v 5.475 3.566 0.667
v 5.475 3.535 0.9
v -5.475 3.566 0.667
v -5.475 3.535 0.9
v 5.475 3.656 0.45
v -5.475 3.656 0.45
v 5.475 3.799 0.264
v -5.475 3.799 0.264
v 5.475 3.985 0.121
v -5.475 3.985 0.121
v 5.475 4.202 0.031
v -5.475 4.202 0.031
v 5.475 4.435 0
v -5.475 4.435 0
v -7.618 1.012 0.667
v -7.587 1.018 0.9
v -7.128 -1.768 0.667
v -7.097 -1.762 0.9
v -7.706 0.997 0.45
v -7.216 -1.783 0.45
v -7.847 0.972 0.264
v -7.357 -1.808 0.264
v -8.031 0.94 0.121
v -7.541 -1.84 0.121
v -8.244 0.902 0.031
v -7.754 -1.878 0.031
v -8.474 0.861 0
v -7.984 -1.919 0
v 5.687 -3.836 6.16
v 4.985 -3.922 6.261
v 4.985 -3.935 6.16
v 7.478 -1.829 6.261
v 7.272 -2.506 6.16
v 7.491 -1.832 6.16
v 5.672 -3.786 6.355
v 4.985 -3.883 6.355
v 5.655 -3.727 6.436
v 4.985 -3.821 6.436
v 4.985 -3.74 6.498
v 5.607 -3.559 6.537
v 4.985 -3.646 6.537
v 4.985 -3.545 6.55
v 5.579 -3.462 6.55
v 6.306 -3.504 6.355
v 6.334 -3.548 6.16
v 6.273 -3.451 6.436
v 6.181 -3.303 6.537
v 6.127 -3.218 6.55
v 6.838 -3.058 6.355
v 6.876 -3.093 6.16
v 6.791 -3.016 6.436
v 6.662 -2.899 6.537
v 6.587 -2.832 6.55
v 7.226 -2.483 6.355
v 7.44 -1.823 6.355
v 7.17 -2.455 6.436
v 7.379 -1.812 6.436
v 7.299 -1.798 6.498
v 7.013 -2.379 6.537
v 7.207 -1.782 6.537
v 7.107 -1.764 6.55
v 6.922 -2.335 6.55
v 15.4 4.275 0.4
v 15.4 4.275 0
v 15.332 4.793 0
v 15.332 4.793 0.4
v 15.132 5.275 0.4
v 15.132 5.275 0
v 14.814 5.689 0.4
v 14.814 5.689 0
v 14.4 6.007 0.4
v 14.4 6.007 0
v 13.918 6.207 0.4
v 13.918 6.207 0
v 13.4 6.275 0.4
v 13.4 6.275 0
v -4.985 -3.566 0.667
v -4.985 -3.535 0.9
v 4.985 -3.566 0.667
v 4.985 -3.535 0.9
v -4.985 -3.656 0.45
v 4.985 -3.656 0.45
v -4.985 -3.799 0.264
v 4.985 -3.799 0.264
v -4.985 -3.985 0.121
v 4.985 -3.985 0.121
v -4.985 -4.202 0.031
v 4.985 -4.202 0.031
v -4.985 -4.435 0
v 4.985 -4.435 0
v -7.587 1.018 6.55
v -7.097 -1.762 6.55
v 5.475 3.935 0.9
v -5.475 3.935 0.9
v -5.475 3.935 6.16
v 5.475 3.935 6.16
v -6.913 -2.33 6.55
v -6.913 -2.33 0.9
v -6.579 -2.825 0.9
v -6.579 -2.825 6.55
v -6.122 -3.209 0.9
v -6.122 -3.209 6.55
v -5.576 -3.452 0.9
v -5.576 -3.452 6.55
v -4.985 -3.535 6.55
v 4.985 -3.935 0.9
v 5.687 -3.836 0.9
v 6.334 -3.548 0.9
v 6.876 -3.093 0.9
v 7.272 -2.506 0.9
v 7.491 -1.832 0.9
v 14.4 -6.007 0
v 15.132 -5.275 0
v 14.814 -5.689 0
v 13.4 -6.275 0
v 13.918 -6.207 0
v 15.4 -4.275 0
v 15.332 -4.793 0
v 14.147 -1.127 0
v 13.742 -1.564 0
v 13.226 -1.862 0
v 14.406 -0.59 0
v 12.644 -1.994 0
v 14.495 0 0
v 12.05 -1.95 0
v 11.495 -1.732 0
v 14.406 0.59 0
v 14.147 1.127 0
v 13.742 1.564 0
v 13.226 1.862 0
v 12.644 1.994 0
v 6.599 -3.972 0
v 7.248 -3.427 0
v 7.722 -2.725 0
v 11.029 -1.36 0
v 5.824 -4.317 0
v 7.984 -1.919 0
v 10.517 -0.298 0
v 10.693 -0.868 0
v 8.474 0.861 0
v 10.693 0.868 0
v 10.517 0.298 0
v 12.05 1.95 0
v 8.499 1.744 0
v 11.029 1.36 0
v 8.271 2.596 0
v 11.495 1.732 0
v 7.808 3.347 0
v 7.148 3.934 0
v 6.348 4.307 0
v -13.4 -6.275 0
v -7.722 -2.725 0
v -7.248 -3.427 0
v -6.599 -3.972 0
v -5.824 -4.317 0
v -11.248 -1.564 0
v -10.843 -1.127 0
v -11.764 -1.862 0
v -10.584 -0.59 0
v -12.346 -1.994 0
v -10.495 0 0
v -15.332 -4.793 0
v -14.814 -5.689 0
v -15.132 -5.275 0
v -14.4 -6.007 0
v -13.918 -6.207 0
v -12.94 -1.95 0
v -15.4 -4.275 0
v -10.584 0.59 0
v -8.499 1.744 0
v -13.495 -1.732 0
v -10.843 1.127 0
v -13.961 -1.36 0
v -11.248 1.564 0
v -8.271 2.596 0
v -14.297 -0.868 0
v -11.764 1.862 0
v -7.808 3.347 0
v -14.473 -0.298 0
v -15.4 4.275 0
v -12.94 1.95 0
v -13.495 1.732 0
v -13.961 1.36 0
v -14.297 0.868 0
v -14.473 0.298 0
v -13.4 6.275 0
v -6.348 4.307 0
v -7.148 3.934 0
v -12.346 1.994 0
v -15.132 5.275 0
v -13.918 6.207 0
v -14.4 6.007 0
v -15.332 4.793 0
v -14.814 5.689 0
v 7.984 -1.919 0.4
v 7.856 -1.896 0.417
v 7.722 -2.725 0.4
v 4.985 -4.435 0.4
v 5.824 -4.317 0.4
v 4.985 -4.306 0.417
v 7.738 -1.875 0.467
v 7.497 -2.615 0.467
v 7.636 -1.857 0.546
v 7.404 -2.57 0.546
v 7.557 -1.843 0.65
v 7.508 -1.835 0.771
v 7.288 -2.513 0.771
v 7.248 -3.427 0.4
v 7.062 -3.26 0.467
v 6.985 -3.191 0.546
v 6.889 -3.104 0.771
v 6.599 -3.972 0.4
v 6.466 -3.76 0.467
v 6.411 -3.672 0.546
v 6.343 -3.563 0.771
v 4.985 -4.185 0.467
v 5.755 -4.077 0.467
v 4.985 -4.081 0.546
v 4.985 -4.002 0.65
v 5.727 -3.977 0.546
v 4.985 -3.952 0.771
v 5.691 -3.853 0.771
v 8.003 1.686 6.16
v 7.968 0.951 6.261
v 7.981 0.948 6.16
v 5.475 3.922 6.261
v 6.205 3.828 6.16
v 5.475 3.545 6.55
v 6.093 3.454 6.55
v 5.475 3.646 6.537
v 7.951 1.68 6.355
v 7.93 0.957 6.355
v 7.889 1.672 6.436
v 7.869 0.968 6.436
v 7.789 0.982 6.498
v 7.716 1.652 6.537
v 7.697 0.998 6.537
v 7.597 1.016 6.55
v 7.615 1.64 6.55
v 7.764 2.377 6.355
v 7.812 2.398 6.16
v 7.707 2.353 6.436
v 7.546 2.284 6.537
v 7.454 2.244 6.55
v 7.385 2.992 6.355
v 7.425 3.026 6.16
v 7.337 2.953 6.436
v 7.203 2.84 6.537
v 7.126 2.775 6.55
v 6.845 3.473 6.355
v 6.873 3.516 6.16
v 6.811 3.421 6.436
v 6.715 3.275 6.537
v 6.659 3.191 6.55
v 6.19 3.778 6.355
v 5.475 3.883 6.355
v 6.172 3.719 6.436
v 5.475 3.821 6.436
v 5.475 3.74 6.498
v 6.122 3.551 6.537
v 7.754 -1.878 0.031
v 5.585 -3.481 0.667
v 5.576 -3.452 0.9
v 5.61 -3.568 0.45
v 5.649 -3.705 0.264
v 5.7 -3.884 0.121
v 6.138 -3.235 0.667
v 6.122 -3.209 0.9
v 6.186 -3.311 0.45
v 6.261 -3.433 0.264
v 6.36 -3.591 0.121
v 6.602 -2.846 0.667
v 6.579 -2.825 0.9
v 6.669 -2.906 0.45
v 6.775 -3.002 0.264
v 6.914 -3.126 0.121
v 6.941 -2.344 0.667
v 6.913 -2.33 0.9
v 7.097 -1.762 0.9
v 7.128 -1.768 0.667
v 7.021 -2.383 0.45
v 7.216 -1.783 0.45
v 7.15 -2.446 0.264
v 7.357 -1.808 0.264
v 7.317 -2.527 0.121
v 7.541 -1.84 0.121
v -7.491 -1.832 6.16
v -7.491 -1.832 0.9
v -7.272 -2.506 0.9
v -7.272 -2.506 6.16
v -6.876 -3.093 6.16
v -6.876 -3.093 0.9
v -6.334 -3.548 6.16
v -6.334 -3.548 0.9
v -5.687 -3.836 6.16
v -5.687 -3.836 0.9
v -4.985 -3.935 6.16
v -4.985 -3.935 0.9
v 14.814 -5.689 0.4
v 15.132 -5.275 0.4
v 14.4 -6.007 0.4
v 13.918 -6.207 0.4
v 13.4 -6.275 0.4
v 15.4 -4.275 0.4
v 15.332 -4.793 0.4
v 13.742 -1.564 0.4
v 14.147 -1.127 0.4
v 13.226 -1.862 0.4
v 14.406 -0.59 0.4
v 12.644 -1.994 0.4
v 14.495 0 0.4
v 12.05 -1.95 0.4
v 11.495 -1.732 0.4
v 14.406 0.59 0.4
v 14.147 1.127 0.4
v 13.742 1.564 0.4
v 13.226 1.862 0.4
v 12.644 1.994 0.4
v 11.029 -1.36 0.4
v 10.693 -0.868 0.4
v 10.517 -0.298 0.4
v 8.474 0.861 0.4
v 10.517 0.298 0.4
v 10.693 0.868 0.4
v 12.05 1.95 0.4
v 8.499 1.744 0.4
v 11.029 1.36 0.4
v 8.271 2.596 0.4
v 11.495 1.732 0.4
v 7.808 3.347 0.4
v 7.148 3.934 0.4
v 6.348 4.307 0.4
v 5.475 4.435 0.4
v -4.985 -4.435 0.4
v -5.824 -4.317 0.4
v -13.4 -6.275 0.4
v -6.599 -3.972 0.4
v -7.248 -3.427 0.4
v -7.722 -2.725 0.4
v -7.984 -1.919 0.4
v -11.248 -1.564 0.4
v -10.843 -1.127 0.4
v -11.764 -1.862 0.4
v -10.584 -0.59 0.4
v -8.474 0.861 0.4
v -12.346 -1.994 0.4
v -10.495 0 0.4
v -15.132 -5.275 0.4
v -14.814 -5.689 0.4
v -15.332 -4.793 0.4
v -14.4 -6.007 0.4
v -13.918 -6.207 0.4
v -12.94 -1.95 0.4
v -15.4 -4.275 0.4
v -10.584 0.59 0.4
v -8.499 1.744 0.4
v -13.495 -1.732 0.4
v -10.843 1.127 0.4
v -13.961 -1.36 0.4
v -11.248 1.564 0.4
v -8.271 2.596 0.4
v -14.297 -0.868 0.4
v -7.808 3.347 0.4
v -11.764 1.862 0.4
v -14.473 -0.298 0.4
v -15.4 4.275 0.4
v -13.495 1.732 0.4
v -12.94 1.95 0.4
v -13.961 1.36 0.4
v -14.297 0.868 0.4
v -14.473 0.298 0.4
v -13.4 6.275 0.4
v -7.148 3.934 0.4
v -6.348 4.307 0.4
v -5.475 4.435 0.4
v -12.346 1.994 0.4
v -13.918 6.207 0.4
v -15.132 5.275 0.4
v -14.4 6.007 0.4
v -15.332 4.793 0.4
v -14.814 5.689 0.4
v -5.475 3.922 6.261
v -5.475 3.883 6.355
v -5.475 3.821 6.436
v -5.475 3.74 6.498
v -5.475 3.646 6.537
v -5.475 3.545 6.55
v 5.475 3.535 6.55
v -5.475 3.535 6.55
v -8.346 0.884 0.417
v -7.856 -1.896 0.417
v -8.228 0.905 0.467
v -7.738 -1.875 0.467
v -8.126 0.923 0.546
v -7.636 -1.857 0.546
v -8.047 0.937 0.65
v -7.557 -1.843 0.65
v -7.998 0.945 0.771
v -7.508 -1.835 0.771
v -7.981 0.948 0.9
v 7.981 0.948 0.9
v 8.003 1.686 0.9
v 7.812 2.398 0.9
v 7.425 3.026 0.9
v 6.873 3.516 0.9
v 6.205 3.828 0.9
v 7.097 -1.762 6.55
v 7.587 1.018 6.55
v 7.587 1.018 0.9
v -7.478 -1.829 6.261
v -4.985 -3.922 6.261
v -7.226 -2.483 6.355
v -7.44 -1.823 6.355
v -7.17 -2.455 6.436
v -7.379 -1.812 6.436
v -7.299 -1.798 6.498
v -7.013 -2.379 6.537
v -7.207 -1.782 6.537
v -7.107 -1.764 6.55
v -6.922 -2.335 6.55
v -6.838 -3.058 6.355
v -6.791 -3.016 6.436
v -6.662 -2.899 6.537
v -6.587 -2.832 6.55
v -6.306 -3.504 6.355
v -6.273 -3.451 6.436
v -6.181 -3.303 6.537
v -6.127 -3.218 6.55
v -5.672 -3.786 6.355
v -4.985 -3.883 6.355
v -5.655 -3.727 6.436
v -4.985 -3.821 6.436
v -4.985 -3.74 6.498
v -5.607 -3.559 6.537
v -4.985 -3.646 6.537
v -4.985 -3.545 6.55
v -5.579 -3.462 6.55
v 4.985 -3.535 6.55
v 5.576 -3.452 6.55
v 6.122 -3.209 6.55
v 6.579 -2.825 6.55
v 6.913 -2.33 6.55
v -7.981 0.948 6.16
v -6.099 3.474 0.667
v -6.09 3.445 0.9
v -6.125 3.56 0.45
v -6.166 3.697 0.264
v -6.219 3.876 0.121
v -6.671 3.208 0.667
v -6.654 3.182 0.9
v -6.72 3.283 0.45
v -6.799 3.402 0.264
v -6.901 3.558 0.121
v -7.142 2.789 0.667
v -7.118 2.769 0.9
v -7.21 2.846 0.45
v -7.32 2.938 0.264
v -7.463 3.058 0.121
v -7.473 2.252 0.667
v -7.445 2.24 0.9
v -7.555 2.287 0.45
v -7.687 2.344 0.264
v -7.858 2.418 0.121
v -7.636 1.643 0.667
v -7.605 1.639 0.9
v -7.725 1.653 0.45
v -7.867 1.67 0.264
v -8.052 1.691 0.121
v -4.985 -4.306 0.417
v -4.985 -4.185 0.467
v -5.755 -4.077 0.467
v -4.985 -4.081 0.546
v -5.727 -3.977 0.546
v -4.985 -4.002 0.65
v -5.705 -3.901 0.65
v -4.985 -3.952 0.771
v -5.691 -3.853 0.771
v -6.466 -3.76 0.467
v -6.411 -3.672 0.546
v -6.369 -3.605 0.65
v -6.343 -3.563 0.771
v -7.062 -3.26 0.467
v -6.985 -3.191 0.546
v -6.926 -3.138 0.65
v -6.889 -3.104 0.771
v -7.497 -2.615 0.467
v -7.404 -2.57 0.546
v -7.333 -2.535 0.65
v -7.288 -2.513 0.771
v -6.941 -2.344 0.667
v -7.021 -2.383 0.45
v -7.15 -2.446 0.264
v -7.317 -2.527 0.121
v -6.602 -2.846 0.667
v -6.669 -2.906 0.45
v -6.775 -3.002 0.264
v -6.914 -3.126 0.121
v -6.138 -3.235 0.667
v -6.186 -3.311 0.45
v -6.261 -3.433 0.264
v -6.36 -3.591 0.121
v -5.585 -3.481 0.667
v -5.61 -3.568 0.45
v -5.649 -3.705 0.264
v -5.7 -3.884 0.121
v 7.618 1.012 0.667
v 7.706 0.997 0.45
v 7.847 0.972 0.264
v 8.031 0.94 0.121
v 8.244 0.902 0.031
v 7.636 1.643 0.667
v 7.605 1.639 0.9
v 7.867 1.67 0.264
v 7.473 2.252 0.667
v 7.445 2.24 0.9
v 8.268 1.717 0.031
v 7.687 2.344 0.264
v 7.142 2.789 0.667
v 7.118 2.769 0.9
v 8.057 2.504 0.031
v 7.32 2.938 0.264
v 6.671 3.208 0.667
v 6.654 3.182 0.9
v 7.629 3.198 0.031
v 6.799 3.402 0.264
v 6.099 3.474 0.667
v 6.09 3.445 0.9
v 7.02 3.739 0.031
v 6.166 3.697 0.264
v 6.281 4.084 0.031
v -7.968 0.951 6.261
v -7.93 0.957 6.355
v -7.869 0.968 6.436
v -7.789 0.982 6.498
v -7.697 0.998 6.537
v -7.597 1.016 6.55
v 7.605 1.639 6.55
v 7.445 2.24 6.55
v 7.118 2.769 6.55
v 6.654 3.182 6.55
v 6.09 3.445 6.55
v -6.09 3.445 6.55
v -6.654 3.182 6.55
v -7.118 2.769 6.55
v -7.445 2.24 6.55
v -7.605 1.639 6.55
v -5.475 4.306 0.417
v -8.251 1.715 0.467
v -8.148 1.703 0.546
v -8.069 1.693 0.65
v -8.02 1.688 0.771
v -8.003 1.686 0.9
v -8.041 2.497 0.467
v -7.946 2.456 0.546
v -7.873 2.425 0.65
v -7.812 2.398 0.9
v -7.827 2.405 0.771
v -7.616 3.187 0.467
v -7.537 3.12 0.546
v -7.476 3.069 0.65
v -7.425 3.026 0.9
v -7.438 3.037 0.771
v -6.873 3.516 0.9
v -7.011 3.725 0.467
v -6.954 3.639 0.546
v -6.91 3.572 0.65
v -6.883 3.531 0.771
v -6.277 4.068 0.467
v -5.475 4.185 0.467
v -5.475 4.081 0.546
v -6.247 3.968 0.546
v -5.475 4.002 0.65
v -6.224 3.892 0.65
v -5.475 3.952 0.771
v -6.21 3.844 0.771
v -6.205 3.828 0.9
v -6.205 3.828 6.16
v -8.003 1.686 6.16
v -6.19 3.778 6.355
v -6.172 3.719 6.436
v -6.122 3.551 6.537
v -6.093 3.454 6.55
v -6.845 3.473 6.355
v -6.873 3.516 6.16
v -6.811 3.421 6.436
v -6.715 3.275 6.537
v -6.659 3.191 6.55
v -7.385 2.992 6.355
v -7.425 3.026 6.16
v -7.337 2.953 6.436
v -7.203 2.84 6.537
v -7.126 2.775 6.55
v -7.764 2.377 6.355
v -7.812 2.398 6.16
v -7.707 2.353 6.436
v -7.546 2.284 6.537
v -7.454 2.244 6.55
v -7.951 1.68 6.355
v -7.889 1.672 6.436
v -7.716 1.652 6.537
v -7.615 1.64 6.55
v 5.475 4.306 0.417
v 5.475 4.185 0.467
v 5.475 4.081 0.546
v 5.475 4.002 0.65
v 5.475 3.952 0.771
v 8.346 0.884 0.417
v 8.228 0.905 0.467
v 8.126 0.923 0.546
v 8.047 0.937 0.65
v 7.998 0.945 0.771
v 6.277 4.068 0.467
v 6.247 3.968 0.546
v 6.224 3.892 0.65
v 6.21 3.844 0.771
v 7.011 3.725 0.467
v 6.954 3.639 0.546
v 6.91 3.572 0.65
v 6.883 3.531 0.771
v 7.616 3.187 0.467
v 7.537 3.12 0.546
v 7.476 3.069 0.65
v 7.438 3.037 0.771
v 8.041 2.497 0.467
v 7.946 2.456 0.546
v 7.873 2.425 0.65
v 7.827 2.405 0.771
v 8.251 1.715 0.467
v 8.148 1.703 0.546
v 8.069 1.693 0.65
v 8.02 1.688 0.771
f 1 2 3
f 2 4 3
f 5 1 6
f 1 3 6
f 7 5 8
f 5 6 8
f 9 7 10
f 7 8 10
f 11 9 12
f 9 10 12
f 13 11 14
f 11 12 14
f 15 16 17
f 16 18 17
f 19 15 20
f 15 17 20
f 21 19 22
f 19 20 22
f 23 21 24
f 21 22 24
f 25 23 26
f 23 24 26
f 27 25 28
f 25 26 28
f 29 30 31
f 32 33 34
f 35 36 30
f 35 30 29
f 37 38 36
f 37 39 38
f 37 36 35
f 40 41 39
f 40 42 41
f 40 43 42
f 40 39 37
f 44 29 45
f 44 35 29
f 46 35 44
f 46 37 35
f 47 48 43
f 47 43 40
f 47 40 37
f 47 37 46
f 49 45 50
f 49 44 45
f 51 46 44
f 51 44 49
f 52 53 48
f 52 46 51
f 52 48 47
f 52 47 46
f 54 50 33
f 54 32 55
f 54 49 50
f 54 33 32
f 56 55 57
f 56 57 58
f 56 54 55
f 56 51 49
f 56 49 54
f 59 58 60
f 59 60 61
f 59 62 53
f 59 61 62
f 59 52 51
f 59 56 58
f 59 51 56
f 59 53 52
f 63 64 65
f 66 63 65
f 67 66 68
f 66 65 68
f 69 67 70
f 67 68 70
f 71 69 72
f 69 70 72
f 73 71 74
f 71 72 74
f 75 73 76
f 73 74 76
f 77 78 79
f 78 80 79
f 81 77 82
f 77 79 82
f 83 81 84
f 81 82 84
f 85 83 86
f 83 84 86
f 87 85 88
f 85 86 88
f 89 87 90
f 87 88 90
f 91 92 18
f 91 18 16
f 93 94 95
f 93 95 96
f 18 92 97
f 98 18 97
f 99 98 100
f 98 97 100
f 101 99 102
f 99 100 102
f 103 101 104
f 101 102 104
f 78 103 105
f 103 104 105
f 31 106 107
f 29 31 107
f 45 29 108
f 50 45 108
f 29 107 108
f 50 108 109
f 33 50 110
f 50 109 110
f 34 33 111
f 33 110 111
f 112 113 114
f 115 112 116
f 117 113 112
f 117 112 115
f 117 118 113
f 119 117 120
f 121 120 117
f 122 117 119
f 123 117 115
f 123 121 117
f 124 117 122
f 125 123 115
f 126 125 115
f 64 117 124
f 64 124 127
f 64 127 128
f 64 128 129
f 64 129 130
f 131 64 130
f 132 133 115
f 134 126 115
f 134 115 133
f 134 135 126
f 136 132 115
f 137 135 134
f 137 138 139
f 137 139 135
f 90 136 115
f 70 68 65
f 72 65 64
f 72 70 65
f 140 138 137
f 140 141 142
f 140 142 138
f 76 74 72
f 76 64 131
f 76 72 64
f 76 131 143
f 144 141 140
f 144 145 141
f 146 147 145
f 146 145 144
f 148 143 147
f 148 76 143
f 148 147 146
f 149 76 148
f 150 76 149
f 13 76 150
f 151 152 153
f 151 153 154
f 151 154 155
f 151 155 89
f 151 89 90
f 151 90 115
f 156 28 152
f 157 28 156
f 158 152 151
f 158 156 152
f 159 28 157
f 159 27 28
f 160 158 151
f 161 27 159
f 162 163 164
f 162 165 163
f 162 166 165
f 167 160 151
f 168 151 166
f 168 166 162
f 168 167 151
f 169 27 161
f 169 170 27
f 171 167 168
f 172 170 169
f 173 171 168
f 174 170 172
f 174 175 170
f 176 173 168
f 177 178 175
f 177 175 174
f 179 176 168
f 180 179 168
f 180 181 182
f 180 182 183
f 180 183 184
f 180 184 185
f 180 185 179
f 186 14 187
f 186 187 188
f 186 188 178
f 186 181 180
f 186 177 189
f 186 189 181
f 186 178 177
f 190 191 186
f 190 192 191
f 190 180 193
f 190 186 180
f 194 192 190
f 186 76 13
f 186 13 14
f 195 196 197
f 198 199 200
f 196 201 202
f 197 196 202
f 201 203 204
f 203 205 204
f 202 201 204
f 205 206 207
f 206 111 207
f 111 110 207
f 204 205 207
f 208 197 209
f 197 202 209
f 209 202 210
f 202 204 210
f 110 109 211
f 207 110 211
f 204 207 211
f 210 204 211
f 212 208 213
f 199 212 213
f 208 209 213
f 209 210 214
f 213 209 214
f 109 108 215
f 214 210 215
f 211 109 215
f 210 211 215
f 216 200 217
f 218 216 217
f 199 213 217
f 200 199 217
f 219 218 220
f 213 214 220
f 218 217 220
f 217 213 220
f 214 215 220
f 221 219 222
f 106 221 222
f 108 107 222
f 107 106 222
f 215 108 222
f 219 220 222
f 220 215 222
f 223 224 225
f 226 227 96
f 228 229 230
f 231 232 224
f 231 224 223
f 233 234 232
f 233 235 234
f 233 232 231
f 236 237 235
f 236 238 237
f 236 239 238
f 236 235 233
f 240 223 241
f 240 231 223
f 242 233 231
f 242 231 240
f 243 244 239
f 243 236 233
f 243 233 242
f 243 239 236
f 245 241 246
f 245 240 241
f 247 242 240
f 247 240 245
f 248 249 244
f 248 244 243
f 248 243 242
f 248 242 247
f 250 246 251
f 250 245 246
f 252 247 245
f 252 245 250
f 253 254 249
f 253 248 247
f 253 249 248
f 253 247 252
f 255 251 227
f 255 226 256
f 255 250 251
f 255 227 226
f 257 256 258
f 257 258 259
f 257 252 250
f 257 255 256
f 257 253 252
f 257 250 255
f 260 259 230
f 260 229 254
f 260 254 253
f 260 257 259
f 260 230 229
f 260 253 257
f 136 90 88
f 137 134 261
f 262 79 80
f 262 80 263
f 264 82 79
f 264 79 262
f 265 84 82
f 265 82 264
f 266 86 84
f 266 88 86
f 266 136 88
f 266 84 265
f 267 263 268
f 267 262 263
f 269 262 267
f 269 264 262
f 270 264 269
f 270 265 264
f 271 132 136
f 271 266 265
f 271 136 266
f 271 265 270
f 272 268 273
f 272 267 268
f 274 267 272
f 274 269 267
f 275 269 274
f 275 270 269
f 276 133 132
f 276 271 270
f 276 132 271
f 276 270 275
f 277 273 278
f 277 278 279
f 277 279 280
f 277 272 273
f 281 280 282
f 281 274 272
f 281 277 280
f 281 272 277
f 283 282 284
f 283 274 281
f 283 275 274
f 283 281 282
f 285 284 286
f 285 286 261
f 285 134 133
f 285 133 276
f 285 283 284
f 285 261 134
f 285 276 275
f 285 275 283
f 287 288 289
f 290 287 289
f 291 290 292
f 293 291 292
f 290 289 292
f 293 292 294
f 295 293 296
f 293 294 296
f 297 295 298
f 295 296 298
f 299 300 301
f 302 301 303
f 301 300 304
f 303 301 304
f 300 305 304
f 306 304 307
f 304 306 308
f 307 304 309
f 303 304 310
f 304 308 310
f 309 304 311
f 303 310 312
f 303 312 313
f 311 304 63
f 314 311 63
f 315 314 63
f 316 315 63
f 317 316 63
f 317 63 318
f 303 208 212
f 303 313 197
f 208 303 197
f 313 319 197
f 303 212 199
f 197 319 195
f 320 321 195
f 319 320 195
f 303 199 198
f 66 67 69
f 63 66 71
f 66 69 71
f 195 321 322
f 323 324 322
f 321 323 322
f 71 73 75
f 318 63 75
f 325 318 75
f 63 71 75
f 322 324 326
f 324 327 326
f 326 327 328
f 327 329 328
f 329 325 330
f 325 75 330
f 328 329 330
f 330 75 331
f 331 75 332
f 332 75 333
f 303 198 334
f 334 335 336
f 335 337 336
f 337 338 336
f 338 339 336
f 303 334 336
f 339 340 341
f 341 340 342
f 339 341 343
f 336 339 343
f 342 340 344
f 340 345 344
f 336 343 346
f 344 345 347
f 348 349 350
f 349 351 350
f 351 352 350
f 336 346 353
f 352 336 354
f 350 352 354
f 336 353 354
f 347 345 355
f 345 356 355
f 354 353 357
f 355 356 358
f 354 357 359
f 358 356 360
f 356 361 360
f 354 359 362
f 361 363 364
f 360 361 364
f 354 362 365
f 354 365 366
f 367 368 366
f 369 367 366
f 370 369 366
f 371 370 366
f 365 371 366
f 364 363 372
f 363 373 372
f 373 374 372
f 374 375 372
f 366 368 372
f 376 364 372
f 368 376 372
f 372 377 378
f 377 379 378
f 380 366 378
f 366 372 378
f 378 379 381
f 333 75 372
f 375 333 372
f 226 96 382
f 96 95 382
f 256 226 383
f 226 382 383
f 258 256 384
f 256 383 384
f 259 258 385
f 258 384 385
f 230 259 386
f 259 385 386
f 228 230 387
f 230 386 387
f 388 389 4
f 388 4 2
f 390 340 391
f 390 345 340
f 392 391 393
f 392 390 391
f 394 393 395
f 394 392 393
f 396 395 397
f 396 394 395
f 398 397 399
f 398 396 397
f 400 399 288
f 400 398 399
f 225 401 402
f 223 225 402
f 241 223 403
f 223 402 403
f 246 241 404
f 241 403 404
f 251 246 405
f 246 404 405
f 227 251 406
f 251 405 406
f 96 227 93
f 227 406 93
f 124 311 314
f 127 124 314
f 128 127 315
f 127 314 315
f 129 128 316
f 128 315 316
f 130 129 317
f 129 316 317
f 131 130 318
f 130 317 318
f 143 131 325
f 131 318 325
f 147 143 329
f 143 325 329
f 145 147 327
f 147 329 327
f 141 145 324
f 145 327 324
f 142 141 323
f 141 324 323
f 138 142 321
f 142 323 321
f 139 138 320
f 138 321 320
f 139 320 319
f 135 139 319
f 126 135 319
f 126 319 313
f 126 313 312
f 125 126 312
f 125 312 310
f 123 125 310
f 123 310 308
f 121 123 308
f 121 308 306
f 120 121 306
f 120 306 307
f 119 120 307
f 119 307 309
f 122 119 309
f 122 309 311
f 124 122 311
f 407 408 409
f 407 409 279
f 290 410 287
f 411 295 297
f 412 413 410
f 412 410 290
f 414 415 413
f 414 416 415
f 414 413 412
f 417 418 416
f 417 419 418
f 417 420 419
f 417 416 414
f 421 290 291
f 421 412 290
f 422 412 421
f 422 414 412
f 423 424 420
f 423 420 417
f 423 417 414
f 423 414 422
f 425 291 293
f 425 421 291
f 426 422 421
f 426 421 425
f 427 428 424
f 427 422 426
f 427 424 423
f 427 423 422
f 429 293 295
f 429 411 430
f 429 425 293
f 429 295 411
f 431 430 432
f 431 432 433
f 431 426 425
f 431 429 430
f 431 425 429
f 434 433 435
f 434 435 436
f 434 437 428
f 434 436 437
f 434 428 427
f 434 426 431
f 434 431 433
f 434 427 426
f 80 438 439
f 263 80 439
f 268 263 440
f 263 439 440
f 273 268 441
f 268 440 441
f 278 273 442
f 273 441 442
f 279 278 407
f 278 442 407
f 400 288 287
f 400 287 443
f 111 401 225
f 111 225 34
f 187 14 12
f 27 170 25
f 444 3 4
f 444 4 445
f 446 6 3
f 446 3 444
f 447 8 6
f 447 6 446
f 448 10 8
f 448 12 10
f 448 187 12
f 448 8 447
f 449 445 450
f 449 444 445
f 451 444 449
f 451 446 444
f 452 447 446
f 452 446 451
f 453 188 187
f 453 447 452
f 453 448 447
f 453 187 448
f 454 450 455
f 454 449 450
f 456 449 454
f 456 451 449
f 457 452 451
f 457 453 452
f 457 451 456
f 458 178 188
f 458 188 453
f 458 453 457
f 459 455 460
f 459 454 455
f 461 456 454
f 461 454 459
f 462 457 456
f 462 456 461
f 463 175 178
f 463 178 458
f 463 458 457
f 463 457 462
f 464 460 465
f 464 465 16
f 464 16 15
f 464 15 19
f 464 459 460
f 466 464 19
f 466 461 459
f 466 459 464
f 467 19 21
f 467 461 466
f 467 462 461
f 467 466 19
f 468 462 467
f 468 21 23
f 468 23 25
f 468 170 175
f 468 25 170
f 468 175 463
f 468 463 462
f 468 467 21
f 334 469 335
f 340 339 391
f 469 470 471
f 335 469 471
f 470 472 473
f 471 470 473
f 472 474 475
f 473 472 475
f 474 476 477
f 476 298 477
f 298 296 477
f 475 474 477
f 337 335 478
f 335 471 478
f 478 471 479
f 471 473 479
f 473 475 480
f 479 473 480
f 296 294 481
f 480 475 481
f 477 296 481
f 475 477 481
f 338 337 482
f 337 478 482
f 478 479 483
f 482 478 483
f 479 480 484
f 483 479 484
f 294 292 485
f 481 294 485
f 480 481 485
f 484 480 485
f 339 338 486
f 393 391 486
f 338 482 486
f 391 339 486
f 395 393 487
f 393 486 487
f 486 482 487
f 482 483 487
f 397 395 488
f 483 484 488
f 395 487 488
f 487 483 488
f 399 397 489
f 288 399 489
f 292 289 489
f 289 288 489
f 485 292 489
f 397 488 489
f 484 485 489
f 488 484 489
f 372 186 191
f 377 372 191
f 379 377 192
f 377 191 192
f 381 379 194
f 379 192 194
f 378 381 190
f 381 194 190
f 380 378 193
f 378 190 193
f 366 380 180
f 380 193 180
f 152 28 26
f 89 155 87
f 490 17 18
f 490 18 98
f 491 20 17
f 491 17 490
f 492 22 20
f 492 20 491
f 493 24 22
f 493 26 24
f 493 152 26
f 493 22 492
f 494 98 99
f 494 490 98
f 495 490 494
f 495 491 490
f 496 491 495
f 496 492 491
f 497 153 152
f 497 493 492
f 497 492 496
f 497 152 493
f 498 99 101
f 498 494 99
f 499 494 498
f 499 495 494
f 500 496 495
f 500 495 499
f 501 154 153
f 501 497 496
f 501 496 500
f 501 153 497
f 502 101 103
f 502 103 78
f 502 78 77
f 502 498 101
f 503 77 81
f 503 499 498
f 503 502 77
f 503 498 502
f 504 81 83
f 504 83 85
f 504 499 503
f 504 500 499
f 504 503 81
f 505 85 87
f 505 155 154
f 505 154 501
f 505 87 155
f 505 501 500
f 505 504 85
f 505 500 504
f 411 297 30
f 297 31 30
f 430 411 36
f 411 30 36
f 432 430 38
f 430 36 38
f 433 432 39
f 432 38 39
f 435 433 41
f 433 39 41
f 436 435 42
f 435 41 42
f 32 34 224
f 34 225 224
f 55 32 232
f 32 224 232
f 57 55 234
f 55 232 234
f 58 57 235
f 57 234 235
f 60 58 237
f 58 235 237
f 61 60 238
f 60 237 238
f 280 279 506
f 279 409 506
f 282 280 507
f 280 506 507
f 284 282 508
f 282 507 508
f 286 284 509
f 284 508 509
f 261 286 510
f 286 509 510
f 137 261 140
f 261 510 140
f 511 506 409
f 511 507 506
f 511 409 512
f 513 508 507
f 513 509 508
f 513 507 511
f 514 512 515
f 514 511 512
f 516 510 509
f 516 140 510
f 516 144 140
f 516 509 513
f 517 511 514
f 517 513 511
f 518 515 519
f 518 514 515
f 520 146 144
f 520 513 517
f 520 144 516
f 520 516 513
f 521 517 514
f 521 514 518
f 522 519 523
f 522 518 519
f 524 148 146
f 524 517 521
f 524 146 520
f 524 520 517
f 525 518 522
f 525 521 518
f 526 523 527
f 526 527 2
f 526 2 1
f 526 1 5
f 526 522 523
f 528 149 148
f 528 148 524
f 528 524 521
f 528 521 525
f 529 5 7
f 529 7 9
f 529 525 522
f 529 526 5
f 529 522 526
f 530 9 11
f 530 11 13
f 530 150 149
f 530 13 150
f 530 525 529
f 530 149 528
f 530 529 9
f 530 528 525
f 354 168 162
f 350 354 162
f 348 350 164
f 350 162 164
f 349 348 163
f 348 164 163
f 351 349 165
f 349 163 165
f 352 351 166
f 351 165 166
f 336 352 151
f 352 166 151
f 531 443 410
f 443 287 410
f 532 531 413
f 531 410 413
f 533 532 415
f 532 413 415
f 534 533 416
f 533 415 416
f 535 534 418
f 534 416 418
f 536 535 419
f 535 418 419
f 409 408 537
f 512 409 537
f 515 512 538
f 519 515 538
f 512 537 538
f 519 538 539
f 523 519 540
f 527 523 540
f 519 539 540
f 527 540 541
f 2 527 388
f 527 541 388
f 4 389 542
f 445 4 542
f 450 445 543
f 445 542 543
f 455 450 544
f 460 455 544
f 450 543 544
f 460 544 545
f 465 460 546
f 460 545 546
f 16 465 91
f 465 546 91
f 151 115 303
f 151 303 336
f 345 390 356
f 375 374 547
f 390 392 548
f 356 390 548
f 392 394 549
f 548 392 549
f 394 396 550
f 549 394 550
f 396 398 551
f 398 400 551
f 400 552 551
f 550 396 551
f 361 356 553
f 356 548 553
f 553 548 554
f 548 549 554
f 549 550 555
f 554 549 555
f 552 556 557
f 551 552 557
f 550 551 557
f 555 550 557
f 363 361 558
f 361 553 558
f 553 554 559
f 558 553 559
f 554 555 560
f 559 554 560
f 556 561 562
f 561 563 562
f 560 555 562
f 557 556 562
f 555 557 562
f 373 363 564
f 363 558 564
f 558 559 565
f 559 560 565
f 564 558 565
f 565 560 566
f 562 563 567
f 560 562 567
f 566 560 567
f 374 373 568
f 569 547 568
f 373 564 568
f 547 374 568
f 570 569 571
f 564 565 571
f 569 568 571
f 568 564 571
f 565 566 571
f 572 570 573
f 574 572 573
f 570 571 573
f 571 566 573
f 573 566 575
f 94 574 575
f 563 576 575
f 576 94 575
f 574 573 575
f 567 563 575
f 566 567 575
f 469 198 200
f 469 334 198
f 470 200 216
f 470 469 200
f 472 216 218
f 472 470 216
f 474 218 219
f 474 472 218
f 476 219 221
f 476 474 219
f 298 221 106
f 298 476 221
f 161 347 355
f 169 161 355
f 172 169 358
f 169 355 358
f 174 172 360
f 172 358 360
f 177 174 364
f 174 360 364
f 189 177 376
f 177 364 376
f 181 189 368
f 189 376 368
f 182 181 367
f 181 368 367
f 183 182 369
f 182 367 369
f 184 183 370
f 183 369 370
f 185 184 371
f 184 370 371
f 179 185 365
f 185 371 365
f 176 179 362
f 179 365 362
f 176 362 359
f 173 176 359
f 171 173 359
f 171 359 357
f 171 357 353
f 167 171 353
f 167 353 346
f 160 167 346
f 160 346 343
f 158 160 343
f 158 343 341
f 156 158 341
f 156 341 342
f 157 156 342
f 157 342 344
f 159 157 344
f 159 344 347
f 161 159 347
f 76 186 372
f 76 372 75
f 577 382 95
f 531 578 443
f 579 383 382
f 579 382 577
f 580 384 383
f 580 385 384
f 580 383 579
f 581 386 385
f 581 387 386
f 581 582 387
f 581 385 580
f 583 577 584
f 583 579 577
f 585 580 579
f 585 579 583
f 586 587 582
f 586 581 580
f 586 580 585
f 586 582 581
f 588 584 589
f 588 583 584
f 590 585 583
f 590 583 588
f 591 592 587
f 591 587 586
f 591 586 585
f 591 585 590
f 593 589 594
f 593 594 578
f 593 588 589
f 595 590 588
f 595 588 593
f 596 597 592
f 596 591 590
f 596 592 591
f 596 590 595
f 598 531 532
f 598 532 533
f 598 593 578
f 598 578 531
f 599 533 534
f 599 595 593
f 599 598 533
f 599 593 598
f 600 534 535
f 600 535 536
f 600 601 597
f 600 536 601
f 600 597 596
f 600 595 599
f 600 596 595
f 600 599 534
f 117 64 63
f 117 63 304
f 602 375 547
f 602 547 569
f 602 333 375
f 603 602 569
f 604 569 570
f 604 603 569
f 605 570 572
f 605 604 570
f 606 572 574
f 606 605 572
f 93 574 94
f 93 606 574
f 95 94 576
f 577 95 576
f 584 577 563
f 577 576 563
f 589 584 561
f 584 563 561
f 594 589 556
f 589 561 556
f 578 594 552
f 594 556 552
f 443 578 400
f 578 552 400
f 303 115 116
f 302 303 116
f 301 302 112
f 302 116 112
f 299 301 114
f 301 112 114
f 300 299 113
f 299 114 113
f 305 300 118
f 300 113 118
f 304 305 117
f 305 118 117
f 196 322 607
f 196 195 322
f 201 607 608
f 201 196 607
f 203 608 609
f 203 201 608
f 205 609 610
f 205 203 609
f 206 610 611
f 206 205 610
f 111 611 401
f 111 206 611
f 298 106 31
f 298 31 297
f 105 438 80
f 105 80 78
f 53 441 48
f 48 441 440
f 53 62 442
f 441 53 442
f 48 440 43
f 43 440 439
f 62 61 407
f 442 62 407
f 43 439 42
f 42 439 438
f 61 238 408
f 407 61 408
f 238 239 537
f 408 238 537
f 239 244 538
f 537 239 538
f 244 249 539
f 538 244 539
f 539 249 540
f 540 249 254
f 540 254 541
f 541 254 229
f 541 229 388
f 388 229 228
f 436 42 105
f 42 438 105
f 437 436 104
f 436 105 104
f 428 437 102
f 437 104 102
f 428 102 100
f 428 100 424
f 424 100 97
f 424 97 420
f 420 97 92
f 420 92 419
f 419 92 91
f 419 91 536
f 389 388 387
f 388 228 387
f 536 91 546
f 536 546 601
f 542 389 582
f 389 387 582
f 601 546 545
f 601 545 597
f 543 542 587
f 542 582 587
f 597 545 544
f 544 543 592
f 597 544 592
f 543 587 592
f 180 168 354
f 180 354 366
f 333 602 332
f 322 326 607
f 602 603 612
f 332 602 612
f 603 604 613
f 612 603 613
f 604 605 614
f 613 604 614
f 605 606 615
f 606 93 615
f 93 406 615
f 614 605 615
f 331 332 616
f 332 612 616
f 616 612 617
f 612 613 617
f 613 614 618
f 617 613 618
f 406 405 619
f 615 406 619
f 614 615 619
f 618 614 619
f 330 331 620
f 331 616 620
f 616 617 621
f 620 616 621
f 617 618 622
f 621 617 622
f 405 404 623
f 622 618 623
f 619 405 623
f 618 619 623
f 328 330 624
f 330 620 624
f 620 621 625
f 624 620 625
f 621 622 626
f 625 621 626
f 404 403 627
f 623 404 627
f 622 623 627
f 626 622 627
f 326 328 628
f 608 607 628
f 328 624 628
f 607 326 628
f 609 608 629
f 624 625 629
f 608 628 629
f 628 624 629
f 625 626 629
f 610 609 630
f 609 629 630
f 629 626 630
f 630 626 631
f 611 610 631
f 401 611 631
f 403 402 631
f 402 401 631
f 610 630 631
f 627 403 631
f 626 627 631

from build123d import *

# Parameters (mm, degrees)
PAD_DEPTH       = 0.4
SKETCH001_R     = 2
POCKET_DEPTH    = 5
PAD001_DEPTH    = 6.15
POCKET001_DEPTH = 6.551
FILLET_R        = 0.5
FILLET001_R     = 0.39
FILLET002_R     = 0.9


with BuildPart() as part:
    # Sketch → Pad (new body)
    with BuildSketch(Plane.XY):
        with BuildLine():
            Line((-13.4, 6.275), (13.4, 6.275))
            ThreePointArc((15.4, 4.275), (14.814214, 5.689214), (13.4, 6.275))
            Line((15.4, 4.275), (15.4, -4.275))
            ThreePointArc((13.4, -6.275), (14.814214, -5.689214), (15.4, -4.275))
            Line((13.4, -6.275), (-13.4, -6.275))
            ThreePointArc((-15.4, -4.275), (-14.814214, -5.689214), (-13.4, -6.275))
            Line((-15.4, -4.275), (-15.4, 4.275))
            ThreePointArc((-13.4, 6.275), (-14.814214, 5.689214), (-15.4, 4.275))
        make_face()
    extrude(amount=PAD_DEPTH)

    # Sketch001 (on Face10 of Pad) → Pocket (cut)
    with BuildSketch(Plane.XY.offset(0.4)):
        with Locations((-12.495, 0)):
            Circle(SKETCH001_R)
        with Locations((12.495, 0)):
            Circle(SKETCH001_R)
    extrude(amount=-POCKET_DEPTH, mode=Mode.SUBTRACT)

    # Sketch002 (on Face5 of Pocket) → Pad001 (join)
    with BuildSketch(Plane.XY.offset(0.4)):
        with BuildLine():
            Line((-5.475, 3.935), (5.475, 3.935))
            ThreePointArc((7.981365, 0.948231), (7.424529, 3.025959), (5.475, 3.935))
            Line((7.981365, 0.948231), (7.491365, -1.831769))
            ThreePointArc((4.985, -3.935), (6.620959, -3.339529), (7.491365, -1.831769))
            Line((4.985, -3.935), (-4.985, -3.935))
            ThreePointArc((-7.491365, -1.831769), (-6.620959, -3.339529), (-4.985, -3.935))
            Line((-7.491365, -1.831769), (-7.981365, 0.948231))
            ThreePointArc((-5.475, 3.935), (-7.424529, 3.025959), (-7.981365, 0.948231))
        make_face()
    extrude(amount=PAD001_DEPTH)

    # Sketch003 (on Face21 of Pad001) → Pocket001 (cut, through all)
    with BuildSketch(Plane.XY.offset(6.55)):
        with BuildLine():
            Line((-5.475, 3.535), (5.475, 3.535))
            ThreePointArc((7.587437, 1.017664), (7.11812, 2.768834), (5.475, 3.535))
            Line((7.587437, 1.017664), (7.097437, -1.762336))
            ThreePointArc((4.985, -3.535), (6.363834, -3.03312), (7.097437, -1.762336))
            Line((4.985, -3.535), (-4.985, -3.535))
            ThreePointArc((-7.097437, -1.762336), (-6.363834, -3.03312), (-4.985, -3.535))
            Line((-7.097437, -1.762336), (-7.587437, 1.017664))
            ThreePointArc((-5.475, 3.535), (-7.11812, 2.768834), (-7.587437, 1.017664))
        make_face()
    extrude(amount=-POCKET001_DEPTH, mode=Mode.SUBTRACT)

    # Fillet
    fillet_edges = [part.edges().sort_by_distance(p)[0] for p in [
        (0, -3.935, 0.4),
    ]]
    fillet(fillet_edges, radius=FILLET_R)

    # Fillet001
    fillet001_edges = [part.edges().sort_by_distance(p)[0] for p in [
        (-6.620959, -3.339529, 6.55),
    ]]
    fillet(fillet001_edges, radius=FILLET001_R)

    # Fillet002
    fillet002_edges = [part.edges().sort_by_distance(p)[0] for p in [
        (0, 3.535, 0),
    ]]
    fillet(fillet002_edges, radius=FILLET002_R)


solid = part.part
